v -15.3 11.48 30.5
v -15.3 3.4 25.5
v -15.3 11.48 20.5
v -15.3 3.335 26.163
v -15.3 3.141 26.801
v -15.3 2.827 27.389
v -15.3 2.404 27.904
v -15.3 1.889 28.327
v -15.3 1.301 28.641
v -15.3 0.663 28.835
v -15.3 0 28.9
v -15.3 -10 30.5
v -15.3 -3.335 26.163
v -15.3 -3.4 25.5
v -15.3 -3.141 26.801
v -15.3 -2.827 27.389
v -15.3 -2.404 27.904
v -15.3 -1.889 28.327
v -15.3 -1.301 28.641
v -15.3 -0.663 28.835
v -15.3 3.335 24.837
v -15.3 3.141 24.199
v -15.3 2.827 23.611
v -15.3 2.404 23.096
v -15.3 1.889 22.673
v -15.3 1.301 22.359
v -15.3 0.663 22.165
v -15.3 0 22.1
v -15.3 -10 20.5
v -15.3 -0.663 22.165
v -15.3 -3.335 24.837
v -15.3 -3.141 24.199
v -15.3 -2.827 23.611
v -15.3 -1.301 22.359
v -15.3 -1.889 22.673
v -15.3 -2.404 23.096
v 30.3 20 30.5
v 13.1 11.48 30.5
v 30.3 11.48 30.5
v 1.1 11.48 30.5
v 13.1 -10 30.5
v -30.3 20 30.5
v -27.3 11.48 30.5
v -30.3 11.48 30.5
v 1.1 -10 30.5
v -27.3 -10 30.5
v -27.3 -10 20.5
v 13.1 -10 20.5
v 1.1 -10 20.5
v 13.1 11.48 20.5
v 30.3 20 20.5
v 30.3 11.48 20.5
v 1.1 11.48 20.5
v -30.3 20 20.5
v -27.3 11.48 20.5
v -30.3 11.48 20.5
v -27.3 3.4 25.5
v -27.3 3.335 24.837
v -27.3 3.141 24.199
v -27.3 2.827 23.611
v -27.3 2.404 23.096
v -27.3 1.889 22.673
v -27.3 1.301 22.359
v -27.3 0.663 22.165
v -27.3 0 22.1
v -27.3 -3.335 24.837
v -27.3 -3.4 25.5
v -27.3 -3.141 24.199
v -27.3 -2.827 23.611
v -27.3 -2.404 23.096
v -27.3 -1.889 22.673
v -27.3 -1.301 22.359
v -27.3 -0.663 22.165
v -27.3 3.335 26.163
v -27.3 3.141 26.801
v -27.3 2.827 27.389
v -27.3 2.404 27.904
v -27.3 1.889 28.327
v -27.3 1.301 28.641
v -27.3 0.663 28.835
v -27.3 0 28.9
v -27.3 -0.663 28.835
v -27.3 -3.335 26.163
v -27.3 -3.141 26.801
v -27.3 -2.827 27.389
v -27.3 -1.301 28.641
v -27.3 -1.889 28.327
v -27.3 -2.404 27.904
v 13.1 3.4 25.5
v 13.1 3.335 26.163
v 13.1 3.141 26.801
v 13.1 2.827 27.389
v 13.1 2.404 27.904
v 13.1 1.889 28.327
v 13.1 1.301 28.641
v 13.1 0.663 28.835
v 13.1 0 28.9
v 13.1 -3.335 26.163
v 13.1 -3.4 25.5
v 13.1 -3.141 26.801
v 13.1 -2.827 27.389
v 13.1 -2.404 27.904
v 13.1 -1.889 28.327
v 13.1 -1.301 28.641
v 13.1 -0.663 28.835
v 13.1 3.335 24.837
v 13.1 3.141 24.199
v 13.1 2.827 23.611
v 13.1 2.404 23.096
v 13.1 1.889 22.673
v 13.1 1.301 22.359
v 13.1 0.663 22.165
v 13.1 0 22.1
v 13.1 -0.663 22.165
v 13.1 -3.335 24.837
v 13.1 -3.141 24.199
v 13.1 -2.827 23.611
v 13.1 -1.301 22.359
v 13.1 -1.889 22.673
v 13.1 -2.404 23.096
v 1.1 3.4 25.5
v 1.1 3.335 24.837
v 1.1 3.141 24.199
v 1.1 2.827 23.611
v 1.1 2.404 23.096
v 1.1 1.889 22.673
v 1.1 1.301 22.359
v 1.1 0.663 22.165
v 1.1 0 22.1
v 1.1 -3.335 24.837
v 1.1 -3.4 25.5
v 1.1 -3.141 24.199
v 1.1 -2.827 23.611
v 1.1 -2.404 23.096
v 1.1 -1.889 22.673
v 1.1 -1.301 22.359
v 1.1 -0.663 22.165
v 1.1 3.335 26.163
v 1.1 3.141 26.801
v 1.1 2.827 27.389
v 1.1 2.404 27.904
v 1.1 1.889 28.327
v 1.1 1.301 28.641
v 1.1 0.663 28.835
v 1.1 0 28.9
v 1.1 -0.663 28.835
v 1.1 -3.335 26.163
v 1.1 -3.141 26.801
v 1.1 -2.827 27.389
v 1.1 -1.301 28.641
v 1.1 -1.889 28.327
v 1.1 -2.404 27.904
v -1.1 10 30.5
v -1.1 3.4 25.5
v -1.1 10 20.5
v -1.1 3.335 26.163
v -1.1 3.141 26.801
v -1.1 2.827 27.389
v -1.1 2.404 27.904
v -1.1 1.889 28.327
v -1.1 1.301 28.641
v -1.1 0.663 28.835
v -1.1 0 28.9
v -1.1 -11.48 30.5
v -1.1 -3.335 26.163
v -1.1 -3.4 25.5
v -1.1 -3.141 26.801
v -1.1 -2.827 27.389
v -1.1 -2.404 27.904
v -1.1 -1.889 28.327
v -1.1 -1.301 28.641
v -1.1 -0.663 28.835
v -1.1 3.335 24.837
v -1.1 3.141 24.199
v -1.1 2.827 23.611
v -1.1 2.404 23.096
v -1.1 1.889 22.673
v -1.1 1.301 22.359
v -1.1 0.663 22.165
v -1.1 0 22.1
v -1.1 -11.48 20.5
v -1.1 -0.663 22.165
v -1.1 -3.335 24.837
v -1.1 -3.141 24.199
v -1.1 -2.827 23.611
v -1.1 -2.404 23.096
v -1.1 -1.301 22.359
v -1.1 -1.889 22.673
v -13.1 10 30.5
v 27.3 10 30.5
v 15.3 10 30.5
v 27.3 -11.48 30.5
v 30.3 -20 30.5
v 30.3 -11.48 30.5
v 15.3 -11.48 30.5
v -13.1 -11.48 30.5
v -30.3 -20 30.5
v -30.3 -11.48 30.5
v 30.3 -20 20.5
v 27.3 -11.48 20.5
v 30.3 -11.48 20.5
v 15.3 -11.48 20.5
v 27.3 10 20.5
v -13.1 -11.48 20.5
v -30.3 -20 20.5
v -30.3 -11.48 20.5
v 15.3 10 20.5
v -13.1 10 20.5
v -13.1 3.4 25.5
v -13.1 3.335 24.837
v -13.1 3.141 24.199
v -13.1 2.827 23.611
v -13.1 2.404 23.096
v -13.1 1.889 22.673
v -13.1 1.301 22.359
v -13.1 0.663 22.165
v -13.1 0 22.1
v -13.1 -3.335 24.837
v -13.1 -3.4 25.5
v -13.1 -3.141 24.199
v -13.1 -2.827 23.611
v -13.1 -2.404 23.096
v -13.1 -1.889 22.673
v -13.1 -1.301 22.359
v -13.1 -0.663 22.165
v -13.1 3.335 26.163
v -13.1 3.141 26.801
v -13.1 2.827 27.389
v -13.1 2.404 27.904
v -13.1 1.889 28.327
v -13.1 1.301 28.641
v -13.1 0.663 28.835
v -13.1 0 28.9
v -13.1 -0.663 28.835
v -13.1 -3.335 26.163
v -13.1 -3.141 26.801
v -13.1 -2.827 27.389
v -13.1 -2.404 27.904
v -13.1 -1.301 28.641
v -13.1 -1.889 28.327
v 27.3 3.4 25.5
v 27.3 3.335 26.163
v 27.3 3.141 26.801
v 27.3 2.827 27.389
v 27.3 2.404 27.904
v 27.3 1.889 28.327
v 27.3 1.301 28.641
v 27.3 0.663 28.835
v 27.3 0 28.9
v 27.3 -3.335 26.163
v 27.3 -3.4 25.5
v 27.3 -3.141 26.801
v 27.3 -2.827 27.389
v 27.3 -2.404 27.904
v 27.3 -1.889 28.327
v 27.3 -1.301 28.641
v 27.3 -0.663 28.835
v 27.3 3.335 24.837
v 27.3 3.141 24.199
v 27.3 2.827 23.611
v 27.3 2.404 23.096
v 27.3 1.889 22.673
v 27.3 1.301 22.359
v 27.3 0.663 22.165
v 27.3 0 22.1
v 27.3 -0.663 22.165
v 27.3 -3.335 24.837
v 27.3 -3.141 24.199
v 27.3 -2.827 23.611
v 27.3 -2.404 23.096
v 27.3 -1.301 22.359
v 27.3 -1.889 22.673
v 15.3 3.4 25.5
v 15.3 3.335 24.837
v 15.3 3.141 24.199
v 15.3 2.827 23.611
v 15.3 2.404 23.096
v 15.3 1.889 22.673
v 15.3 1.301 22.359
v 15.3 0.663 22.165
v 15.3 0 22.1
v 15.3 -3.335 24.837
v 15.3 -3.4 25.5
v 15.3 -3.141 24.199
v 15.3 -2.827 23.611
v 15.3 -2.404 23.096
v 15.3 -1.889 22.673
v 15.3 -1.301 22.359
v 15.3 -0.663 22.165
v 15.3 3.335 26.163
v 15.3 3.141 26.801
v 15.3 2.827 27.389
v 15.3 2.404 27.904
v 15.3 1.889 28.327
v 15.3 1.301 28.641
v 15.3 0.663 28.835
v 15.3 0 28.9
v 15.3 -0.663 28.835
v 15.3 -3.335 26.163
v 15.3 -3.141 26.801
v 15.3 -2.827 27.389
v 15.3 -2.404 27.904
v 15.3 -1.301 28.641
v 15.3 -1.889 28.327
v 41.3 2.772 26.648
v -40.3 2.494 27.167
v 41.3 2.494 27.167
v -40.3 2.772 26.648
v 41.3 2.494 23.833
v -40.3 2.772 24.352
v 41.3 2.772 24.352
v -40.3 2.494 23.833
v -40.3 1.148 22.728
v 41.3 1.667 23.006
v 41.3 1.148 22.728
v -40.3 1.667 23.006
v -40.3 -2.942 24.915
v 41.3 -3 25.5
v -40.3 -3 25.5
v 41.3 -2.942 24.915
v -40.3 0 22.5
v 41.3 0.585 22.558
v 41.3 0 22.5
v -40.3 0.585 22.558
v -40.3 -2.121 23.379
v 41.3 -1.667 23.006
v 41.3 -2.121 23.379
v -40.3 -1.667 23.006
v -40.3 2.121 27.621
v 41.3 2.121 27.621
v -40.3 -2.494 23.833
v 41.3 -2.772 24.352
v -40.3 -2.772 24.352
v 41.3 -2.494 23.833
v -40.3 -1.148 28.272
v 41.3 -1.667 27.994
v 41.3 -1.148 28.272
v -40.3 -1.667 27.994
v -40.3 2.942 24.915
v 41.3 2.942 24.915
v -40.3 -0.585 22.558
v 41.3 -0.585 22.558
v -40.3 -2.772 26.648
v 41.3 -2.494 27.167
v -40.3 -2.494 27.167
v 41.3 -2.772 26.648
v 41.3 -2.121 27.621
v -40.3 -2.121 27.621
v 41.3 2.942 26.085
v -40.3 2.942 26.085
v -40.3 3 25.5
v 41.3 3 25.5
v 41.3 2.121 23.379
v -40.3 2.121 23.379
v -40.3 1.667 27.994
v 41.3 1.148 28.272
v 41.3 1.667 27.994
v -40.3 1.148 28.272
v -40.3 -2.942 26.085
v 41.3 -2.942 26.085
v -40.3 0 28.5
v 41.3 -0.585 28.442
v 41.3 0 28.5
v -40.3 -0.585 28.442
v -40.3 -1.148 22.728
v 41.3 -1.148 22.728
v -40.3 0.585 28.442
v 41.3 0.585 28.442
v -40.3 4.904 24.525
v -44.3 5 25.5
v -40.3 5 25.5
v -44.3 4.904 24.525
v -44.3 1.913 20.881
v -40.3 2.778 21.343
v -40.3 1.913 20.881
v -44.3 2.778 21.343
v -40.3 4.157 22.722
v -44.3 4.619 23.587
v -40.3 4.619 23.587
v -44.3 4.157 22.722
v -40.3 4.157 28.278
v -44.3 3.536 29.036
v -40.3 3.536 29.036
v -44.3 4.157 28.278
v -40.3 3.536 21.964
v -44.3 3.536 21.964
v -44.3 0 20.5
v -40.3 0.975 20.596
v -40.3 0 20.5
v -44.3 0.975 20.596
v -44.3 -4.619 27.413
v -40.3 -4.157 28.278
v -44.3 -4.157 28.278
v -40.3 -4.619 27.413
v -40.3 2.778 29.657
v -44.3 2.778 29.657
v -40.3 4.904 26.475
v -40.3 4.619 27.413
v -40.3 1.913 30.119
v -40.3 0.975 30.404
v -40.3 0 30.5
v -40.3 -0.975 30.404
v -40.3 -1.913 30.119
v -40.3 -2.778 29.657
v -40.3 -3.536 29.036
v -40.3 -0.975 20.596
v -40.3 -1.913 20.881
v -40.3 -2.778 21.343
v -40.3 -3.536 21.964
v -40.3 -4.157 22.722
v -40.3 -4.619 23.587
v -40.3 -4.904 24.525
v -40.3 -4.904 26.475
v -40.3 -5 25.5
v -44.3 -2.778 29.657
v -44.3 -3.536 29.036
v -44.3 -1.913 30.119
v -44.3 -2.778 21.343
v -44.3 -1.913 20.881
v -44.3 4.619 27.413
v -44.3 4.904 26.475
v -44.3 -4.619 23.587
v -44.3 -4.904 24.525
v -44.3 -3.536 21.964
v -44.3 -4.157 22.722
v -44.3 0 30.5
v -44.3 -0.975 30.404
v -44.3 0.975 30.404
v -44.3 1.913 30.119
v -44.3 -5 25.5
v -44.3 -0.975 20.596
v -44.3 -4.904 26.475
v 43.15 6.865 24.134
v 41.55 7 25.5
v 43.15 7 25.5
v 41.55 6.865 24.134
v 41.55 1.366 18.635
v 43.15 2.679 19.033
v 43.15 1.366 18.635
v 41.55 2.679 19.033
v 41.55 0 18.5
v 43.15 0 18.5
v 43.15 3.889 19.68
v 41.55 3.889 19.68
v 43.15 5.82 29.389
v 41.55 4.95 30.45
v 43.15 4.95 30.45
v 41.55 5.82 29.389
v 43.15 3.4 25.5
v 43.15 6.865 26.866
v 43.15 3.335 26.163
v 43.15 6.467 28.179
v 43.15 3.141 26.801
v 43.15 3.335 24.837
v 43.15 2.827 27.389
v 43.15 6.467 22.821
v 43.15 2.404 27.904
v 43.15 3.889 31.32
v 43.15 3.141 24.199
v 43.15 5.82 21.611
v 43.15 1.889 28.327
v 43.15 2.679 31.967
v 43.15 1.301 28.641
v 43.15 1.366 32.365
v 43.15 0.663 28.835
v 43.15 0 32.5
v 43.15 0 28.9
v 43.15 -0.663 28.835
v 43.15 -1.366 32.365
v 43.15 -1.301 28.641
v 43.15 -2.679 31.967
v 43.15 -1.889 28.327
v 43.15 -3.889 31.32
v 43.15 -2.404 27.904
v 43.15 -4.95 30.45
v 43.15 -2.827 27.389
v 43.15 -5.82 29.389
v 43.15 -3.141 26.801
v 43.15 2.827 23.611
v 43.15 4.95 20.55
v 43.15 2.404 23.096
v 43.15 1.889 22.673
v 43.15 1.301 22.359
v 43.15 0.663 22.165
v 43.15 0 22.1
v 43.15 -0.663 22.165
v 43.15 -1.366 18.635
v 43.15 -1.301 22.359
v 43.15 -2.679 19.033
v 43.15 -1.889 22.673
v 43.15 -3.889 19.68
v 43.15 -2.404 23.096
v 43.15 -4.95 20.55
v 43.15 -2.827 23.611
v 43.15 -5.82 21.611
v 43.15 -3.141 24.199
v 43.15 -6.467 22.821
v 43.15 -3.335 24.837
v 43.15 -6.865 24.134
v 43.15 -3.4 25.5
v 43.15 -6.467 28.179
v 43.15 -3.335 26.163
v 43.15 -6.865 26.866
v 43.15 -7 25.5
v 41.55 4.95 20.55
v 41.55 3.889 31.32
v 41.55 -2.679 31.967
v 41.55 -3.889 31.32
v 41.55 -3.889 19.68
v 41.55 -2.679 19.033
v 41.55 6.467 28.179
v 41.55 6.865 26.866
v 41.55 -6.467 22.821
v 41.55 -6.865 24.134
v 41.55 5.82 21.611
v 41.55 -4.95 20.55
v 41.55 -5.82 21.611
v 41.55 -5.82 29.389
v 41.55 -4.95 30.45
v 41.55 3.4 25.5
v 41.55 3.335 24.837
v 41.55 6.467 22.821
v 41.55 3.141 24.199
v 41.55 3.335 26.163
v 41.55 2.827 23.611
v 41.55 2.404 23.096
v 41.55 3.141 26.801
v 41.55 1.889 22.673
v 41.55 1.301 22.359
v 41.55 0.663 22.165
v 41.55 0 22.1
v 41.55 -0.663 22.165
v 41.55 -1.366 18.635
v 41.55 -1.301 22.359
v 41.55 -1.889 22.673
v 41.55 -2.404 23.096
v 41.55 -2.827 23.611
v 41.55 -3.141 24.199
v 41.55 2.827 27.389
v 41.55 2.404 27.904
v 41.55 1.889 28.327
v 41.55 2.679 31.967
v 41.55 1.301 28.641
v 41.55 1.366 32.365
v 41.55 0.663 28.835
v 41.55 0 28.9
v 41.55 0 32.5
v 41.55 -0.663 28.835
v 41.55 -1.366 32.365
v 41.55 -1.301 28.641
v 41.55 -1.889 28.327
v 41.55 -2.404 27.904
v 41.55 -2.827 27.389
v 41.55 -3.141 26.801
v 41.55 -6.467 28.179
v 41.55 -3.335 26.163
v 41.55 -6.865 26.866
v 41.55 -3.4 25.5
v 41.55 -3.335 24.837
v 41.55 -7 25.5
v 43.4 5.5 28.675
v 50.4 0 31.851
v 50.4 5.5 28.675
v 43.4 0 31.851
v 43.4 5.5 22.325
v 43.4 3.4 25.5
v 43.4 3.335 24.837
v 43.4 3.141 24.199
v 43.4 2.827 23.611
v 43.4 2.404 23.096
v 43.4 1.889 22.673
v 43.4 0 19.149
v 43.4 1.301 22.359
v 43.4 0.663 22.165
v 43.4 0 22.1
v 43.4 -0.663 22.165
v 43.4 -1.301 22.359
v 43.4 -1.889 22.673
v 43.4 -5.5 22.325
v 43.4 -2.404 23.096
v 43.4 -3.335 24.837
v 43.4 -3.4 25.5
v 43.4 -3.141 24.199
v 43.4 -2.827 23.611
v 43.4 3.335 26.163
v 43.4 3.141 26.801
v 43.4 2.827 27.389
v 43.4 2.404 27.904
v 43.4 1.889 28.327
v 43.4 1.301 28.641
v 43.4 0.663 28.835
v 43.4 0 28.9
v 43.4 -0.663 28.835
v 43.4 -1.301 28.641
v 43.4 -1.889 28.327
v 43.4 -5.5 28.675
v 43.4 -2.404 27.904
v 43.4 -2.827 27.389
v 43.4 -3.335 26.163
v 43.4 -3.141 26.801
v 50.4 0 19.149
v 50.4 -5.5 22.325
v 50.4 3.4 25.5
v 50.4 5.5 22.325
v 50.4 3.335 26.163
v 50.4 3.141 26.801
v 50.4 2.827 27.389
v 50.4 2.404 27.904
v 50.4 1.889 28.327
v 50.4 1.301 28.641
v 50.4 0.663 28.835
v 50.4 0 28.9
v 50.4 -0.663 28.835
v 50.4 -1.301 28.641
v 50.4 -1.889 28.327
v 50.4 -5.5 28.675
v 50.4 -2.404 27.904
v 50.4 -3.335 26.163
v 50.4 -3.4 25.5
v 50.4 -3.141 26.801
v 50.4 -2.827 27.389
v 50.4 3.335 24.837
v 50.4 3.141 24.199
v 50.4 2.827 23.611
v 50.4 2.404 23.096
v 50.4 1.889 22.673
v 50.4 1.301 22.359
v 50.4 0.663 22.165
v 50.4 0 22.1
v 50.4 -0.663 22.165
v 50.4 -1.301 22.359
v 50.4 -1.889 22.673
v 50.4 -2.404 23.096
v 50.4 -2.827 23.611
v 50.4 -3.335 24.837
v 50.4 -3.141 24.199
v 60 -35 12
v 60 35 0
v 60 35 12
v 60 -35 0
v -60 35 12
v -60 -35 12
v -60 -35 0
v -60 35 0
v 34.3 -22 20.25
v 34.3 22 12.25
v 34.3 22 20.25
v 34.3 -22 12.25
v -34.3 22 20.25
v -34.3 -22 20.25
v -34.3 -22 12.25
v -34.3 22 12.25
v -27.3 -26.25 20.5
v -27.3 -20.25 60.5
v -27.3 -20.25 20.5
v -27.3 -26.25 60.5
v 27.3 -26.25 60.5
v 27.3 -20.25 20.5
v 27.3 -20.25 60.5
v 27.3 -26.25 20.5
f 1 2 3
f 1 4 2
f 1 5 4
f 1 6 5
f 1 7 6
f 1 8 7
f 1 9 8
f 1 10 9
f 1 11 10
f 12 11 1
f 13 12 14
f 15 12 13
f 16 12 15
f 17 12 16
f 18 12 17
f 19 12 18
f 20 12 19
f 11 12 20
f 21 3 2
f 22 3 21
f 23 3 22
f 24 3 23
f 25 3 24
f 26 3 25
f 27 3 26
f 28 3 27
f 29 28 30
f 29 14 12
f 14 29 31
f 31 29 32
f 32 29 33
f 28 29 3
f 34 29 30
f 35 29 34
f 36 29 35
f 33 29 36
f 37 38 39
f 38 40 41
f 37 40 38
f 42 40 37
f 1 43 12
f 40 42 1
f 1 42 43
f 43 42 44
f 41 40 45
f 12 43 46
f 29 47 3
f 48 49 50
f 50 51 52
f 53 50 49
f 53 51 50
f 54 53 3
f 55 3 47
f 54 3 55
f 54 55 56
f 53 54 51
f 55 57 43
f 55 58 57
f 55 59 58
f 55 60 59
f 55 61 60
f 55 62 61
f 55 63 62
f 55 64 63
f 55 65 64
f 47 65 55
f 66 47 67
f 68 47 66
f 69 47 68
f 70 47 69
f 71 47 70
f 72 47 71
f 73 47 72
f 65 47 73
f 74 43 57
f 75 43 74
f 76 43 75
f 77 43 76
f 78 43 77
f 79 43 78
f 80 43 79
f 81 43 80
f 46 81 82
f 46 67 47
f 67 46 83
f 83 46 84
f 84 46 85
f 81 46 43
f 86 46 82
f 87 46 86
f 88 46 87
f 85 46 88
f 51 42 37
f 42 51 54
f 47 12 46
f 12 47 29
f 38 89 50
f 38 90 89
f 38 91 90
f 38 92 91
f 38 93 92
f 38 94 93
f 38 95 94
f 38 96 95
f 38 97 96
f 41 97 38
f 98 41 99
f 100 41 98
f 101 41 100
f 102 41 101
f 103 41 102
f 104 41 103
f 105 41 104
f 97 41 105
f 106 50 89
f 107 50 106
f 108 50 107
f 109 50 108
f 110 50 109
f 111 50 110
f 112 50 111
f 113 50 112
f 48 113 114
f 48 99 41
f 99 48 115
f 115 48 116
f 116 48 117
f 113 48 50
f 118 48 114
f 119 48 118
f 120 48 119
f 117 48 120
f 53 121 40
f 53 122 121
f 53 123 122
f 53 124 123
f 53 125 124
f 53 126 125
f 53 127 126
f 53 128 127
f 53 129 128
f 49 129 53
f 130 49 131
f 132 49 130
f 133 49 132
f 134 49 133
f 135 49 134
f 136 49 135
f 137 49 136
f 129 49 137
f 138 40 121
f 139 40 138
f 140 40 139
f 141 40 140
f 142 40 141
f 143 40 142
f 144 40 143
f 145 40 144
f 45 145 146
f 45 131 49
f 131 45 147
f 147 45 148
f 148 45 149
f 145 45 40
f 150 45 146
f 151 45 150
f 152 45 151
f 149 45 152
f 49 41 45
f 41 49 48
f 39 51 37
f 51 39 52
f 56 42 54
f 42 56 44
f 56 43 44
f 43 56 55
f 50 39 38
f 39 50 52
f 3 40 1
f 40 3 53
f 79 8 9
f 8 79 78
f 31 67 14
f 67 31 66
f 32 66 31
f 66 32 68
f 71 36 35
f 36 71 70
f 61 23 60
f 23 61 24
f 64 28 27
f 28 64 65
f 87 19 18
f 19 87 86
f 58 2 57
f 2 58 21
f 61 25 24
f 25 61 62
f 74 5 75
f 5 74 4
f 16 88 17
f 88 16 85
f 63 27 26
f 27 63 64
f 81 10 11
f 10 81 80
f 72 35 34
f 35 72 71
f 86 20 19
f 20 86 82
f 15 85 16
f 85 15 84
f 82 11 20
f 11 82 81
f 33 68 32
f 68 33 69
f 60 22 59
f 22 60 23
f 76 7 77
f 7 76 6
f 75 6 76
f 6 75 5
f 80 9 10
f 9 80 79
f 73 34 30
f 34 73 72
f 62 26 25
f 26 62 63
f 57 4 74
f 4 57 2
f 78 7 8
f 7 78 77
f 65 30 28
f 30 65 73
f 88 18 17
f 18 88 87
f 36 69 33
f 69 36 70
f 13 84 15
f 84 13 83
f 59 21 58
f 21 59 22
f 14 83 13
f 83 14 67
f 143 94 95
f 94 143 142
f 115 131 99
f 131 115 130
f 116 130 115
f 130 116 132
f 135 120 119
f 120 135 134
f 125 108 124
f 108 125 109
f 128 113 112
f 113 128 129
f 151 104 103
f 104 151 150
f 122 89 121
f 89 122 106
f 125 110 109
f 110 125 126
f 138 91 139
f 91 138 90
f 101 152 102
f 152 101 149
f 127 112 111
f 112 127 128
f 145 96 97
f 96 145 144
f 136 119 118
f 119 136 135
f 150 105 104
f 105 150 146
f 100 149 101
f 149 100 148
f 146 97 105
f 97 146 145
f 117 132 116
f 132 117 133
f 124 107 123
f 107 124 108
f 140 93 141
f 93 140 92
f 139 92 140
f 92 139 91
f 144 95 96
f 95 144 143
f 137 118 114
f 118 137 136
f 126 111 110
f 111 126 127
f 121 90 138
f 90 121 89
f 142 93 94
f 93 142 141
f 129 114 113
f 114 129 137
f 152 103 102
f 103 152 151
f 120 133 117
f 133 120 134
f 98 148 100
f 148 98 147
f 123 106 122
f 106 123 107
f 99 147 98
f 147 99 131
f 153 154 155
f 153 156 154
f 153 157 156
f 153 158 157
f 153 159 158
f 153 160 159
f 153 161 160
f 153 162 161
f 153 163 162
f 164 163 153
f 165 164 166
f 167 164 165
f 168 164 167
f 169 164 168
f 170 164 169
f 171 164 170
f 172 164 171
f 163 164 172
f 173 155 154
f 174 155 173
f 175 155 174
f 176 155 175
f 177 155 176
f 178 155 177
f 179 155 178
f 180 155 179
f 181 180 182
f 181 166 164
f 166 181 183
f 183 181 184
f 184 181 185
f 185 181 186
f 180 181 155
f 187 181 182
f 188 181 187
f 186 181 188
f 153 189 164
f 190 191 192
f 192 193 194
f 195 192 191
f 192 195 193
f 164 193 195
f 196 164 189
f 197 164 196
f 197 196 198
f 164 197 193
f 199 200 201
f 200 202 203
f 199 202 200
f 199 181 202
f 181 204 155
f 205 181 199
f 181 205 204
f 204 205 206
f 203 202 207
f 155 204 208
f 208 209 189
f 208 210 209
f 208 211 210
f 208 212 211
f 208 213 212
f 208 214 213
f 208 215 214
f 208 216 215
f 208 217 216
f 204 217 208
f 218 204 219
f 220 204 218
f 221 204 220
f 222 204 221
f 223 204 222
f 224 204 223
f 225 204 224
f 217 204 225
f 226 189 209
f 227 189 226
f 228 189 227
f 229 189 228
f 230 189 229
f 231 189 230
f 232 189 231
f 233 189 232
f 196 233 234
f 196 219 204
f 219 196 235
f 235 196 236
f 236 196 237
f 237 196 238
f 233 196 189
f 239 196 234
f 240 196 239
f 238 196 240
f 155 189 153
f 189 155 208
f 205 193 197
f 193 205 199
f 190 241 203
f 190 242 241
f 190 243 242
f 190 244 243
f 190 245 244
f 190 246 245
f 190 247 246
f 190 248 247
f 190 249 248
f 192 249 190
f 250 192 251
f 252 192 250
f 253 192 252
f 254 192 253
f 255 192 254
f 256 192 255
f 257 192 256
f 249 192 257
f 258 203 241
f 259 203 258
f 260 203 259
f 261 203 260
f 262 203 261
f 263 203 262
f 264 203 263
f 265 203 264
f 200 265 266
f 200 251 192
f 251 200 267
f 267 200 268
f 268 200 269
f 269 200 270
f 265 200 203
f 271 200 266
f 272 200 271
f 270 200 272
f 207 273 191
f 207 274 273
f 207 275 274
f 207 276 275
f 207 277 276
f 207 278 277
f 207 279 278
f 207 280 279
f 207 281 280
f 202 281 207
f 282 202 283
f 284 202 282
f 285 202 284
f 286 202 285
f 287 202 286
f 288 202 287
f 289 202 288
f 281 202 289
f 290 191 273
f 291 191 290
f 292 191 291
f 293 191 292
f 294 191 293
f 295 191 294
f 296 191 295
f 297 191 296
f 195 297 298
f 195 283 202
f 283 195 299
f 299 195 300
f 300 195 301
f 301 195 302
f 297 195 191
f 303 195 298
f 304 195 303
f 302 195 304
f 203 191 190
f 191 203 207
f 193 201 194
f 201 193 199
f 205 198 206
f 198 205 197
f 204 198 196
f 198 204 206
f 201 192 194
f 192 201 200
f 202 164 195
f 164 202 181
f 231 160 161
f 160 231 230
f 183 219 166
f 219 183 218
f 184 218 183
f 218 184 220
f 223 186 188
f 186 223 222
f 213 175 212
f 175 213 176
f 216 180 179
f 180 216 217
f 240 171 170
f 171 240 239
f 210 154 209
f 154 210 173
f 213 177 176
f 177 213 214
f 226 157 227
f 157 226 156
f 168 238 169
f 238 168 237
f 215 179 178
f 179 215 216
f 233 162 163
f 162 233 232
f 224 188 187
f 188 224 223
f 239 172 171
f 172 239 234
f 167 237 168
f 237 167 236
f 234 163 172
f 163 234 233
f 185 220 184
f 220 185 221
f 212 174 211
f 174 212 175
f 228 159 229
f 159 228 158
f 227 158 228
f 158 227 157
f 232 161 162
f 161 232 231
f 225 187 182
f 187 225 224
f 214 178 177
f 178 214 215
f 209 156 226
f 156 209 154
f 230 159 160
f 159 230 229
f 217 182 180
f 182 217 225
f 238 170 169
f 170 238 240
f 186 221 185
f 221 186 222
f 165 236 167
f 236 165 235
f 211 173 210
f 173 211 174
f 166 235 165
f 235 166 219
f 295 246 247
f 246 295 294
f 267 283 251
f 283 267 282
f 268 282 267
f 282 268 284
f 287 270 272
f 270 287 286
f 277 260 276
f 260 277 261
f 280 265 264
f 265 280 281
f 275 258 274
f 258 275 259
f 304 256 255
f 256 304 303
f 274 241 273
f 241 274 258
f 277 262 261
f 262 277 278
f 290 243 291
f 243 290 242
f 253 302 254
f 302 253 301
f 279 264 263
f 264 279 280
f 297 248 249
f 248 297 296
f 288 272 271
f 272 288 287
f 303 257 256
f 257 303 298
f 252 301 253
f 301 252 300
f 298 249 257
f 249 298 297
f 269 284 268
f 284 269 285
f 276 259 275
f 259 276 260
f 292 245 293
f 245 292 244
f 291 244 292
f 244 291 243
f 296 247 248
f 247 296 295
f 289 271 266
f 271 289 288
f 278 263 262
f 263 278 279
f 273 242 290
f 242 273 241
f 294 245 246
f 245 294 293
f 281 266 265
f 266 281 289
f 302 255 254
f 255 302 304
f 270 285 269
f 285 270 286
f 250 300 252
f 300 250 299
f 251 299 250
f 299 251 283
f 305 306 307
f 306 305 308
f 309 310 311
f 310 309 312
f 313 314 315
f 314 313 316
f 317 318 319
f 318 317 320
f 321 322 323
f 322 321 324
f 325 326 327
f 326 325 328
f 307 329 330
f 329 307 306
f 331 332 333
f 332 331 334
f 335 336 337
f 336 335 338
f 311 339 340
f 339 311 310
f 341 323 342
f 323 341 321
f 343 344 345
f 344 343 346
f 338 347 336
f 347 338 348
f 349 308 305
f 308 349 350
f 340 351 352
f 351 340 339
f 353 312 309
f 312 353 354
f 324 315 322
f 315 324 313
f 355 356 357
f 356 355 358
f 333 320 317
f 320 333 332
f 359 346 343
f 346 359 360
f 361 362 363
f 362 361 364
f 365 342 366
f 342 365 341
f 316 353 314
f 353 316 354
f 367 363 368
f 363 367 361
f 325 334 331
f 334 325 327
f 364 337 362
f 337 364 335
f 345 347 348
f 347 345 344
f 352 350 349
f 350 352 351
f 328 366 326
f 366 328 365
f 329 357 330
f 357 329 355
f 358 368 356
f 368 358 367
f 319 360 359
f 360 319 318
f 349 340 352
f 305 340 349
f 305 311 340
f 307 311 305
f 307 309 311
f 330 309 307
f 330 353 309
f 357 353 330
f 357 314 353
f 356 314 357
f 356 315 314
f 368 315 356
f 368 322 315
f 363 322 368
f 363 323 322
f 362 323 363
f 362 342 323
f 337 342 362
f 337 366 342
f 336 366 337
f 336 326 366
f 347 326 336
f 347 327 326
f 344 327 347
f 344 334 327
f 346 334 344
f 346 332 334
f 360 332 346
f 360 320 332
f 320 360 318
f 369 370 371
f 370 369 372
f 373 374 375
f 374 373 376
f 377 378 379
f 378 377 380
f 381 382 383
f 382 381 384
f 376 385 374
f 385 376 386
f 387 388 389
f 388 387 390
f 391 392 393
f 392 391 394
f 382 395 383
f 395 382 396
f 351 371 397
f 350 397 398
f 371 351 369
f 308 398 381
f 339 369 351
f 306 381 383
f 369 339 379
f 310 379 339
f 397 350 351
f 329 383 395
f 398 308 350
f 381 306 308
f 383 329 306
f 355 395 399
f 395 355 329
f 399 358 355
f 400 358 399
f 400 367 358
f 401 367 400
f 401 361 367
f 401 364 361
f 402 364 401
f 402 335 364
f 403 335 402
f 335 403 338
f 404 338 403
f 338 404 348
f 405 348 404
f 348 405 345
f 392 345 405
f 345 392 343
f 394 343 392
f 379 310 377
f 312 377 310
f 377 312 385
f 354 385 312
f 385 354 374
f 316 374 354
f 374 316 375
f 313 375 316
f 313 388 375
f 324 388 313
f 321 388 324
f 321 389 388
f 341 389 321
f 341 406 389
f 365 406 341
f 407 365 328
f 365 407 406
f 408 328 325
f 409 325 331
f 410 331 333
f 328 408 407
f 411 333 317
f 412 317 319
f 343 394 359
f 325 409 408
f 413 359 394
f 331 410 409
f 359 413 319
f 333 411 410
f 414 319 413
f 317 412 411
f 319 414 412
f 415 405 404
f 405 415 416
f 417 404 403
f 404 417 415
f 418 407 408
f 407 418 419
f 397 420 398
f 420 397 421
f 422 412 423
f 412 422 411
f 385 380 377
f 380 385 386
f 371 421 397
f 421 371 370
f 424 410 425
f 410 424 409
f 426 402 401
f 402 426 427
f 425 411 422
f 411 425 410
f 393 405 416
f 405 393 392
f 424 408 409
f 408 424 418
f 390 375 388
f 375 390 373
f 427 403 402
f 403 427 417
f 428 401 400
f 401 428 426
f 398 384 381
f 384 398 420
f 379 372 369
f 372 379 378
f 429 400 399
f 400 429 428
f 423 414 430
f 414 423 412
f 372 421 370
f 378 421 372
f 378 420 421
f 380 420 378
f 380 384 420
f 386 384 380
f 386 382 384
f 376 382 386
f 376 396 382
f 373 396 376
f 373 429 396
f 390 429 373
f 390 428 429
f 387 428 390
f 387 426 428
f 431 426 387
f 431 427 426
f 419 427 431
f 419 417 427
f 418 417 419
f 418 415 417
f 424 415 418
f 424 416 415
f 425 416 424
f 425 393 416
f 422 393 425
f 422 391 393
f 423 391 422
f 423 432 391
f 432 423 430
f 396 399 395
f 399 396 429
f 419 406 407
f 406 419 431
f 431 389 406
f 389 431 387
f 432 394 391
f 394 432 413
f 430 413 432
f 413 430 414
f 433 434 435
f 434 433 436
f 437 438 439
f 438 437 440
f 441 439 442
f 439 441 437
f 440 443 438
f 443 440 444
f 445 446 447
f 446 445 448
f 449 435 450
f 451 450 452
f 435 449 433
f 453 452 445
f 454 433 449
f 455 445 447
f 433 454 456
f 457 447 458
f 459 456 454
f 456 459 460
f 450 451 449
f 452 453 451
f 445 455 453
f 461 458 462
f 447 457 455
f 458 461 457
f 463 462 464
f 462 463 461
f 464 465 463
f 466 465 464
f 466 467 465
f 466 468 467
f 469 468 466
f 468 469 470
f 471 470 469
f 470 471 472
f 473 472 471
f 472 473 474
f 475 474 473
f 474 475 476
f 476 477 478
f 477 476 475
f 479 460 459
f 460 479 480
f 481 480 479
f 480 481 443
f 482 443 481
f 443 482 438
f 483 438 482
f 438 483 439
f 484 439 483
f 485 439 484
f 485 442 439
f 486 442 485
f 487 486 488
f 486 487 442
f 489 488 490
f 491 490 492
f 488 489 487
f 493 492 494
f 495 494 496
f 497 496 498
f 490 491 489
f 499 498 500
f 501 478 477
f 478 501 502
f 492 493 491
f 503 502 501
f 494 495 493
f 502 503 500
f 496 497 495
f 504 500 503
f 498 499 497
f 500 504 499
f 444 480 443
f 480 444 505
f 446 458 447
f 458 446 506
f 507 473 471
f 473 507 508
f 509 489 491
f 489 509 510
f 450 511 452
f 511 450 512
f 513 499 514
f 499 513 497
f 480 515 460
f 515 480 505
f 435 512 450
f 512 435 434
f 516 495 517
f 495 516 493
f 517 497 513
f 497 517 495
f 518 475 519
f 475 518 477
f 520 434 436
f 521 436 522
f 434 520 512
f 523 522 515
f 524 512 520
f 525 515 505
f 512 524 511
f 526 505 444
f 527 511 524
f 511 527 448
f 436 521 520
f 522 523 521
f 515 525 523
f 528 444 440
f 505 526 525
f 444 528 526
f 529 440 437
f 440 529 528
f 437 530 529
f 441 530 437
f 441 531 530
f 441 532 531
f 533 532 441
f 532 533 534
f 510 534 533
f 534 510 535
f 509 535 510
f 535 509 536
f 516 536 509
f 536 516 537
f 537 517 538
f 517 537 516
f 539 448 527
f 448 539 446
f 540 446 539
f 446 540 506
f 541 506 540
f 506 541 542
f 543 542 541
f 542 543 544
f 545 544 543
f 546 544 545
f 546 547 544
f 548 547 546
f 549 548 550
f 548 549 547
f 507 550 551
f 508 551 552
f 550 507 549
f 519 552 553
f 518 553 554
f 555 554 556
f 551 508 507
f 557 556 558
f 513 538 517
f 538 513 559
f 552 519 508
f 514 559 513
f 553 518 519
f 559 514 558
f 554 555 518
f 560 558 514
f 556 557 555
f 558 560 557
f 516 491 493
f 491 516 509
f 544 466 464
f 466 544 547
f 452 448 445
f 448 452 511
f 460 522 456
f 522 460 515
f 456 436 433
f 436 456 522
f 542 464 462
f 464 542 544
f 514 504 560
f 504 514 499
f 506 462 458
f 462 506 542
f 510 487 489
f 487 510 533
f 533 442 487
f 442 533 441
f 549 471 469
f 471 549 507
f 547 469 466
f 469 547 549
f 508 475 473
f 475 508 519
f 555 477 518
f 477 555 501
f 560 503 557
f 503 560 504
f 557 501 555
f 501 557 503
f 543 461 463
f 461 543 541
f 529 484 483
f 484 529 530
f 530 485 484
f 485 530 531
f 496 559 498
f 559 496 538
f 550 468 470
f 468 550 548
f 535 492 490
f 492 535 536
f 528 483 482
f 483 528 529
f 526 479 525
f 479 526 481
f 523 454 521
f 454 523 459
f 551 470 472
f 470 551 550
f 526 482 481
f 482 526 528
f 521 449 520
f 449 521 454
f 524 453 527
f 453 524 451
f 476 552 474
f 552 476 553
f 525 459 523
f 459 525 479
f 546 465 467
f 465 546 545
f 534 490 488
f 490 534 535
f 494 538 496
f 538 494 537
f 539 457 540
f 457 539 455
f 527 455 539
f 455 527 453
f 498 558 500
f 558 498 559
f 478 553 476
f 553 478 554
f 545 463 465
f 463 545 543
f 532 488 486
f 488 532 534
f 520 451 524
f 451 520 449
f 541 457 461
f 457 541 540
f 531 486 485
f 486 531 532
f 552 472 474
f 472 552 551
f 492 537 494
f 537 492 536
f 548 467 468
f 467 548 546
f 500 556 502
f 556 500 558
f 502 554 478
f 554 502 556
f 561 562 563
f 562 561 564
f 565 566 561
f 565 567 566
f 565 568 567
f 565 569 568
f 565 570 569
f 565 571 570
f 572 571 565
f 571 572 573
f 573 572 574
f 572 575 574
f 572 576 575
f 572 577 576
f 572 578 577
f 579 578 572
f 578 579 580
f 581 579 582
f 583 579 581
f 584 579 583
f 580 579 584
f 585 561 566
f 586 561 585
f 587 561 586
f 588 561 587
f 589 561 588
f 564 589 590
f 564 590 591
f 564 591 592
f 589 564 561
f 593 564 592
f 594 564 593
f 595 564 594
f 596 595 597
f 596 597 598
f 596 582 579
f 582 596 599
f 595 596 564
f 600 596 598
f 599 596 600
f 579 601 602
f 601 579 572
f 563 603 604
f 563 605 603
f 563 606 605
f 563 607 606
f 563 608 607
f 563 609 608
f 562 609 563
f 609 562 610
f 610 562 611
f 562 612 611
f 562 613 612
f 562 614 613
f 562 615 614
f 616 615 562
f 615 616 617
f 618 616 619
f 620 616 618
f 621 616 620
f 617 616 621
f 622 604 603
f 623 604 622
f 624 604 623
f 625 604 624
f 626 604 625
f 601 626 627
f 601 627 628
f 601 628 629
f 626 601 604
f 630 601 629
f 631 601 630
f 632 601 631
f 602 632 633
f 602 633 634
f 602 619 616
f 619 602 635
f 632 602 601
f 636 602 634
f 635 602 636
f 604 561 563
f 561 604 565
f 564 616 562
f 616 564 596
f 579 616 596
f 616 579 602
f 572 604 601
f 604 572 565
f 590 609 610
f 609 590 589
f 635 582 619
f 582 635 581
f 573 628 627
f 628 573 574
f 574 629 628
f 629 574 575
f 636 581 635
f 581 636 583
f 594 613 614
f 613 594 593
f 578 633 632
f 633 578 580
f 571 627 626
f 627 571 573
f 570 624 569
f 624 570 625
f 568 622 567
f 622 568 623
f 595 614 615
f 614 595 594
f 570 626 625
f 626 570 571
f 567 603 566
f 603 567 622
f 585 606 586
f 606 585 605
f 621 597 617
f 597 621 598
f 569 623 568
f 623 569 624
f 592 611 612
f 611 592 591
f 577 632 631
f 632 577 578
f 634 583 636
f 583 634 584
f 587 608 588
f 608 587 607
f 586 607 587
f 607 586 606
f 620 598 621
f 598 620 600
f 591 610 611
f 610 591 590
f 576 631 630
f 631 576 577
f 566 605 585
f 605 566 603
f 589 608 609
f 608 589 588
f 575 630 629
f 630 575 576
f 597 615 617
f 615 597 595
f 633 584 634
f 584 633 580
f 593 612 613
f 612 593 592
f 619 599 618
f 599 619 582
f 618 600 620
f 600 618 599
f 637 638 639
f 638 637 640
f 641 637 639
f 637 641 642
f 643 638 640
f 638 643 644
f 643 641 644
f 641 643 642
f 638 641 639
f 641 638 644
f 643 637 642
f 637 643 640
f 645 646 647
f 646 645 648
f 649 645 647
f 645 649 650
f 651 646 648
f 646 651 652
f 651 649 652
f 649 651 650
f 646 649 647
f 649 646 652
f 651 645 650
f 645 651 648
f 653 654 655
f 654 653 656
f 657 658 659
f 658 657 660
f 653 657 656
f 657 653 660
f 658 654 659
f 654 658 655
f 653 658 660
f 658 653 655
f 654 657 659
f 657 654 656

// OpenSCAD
$fn = 32;

// ------------------------------------------------------------------------
// Comb hinge with flap: leaf 60.6 x 20 mm, pin d6, flap 40 mm
// Every part is its own module, assembly() places every instance.
// ------------------------------------------------------------------------

// --- part 1 ---
module hinge_bed() {
  difference() {
    translate([-60, -35, 0]) cube([120, 70, 12]);
  }
}

// --- part 2 ---
module hinge_riser() {
  difference() {
    translate([-34.3, -22, 0]) cube([68.6, 44, 8]);
  }
}

// --- part 3 ---
module hinge_leaf_a() {
  difference() {
    union() {
      translate([-27.3, -10, -5]) cube([12, 30, 10]);
      translate([1.1, -10, -5]) cube([12, 30, 10]);
      translate([-30.3, 11.48, -5]) cube([60.6, 8.52, 10]);
    }
    translate([-21.3, 0, 0]) rotate([0, 90, 0]) cylinder(h = 14, d = 6.8, center = true);
    translate([7.1, 0, 0]) rotate([0, 90, 0]) cylinder(h = 14, d = 6.8, center = true);
  }
}

// --- part 4 ---
module hinge_leaf_b() {
  difference() {
    union() {
      translate([-13.1, -20, -5]) cube([12, 30, 10]);
      translate([15.3, -20, -5]) cube([12, 30, 10]);
      translate([-30.3, -20, -5]) cube([60.6, 8.52, 10]);
    }
    translate([-7.1, 0, 0]) rotate([0, 90, 0]) cylinder(h = 14, d = 6.8, center = true);
    translate([21.3, 0, 0]) rotate([0, 90, 0]) cylinder(h = 14, d = 6.8, center = true);
  }
}

// --- part 5 ---
module hinge_flap() {
  difference() {
    translate([-27.3, -20, 0]) cube([54.6, 40, 6]);
  }
}

// --- part 6 ---
module hinge_pin() {
  rotate([0, 90, 0]) cylinder(h = 82.6, d = 6, center = true);
  translate([-44.3, 0, 0]) rotate([0, 90, 0]) cylinder(h = 4, d = 10);
}

// --- part 7 ---
module pin_washer() {
  difference() {
      translate([0, 0, 0]) cylinder(h = 1.6, d = 14);
      translate([0, 0, -1]) cylinder(h = 3.6, d = 6.8);
    }
}

// --- part 8 ---
module pin_nut() {
  difference() {
    linear_extrude(height = 7) polygon(points = [[6.351, 0], [3.175, 5.5], [-3.175, 5.5], [-6.351, 0], [-3.175, -5.5], [3.175, -5.5]]);
    translate([0, 0, -1]) cylinder(h = 9, d = 6.8);
  }
}

// --- assembly ---
module assembly() {
  color([0.80, 0.24, 0.20]) translate([0, 0, 0]) rotate([0, 0, 0]) hinge_bed();
  color([0.20, 0.45, 0.75]) translate([0, 0, 12.25]) rotate([0, 0, 0]) hinge_riser();
  color([0.25, 0.62, 0.32]) translate([0, 0, 25.5]) rotate([0, 0, 0]) hinge_leaf_a();
  color([0.92, 0.70, 0.18]) translate([0, 0, 25.5]) rotate([0, 0, 0]) hinge_leaf_b();
  color([0.58, 0.35, 0.70]) translate([0, -20.25, 40.5]) rotate([90, 0, 0]) hinge_flap();
  color([0.16, 0.66, 0.66]) translate([0, 0, 25.5]) rotate([0, 0, 0]) hinge_pin();
  color([0.85, 0.48, 0.18]) translate([41.55, 0, 25.5]) rotate([0, 90, 0]) pin_washer();
  color([0.55, 0.60, 0.65]) translate([43.4, 0, 25.5]) rotate([0, 90, 0]) pin_nut();
}

assembly();
